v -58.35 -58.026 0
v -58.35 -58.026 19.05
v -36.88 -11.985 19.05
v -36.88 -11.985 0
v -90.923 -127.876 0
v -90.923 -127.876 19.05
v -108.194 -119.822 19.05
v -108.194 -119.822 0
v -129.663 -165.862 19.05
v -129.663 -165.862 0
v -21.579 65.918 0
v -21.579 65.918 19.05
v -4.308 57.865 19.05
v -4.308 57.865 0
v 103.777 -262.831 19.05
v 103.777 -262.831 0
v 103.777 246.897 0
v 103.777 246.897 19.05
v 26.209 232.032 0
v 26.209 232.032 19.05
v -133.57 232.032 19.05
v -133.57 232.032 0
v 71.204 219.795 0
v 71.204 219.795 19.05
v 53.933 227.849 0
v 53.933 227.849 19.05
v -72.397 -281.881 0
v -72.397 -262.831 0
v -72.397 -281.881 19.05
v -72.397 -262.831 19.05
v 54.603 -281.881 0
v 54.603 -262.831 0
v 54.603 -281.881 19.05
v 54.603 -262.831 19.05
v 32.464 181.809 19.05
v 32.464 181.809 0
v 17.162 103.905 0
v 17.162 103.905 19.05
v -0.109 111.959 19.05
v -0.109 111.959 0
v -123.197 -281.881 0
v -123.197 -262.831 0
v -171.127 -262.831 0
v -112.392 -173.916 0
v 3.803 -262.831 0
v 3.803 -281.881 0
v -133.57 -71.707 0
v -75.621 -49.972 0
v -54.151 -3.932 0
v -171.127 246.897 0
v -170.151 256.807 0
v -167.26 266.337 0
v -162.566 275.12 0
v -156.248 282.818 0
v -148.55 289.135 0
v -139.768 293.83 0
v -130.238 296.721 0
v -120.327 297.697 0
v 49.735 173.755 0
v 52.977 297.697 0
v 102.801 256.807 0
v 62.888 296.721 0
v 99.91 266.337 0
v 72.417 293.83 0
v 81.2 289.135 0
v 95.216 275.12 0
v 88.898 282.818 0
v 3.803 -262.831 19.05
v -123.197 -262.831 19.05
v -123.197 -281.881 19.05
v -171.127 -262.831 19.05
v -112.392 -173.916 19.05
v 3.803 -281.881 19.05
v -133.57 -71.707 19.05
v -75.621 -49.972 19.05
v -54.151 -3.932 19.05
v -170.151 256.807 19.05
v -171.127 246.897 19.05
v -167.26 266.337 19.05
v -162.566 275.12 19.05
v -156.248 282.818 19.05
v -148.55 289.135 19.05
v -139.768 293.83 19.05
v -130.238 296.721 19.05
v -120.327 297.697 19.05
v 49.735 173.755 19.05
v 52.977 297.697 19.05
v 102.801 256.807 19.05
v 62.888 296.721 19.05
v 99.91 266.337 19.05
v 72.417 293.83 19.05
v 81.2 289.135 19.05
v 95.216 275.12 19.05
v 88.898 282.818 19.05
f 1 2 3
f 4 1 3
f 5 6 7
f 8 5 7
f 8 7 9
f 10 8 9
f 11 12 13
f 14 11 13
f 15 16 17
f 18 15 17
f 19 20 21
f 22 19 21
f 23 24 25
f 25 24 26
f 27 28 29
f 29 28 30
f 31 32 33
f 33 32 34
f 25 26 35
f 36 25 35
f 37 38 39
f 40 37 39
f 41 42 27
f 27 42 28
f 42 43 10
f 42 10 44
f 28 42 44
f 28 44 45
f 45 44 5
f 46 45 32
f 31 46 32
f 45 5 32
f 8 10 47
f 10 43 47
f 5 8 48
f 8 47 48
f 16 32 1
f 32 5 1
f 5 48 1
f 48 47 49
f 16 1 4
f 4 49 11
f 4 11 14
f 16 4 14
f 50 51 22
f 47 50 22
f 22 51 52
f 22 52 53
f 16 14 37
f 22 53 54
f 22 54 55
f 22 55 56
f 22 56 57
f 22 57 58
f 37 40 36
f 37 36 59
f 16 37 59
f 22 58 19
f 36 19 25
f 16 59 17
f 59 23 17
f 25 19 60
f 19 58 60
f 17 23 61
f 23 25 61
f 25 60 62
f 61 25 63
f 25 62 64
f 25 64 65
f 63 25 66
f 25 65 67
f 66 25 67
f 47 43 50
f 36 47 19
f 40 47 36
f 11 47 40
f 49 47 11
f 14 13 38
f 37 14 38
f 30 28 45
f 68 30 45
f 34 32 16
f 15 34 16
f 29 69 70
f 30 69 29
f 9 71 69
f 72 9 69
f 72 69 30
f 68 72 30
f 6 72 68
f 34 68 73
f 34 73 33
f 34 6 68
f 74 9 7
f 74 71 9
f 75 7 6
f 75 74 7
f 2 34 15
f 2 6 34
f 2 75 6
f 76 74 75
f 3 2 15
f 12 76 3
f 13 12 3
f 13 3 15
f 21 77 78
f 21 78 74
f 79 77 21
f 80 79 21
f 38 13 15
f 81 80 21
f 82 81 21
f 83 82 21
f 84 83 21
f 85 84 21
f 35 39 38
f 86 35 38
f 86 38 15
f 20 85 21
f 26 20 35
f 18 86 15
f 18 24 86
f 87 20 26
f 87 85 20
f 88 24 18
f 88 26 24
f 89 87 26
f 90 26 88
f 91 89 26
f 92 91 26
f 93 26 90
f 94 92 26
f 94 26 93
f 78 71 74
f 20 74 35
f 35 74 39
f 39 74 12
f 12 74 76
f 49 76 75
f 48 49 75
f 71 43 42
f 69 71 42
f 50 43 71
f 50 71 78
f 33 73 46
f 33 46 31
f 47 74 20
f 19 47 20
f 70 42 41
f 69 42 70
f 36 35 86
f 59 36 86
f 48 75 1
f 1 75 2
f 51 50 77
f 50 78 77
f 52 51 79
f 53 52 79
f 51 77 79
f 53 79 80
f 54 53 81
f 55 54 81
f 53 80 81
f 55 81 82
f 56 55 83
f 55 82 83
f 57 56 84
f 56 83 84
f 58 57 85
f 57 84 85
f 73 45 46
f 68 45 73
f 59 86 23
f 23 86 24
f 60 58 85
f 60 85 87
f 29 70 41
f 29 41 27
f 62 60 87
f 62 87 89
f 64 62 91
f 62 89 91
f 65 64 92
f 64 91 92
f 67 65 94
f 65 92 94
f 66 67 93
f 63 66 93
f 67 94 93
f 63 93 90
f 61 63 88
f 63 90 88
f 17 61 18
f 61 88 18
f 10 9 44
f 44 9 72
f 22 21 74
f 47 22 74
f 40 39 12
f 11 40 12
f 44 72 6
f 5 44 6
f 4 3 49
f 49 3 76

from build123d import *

# Parameters (mm, degrees)
F0_W     = 274.9042
F0_H     = 560.5272
F1_DEPTH = 19.05
F3_DEPTH = 25.4
F4_W     = 50.8
F4_H     = 19.05
F5_DEPTH = 19.05
F7_DEPTH = 19.05
F8_R     = 50.8


with BuildPart() as f1:
    # F0 (on Top) → F1 (new body)
    with BuildSketch(Plane.XY):
        with Locations((-33.675123, 17.433073)):
            Rectangle(F0_W, F0_H)
    extrude(amount=F1_DEPTH)

    # F2 (on face) → F3 (cut)
    with BuildSketch(Plane.XY.offset(19.05)):
        Polygon((49.734686, 173.754715), (71.204288, 219.794873), (53.93326, 227.848758), (32.463658, 181.808599), align=None)
        Polygon((-21.578634, 65.918441), (-4.307605, 57.864557), (17.161997, 103.904715), (-0.109031, 111.958599), align=None)
        Polygon((-75.620925, -49.971717), (-58.349897, -58.025601), (-36.880294, -11.985443), (-54.151322, -3.931559), align=None)
        Polygon((-129.663216, -165.861875), (-112.392188, -173.915759), (-90.922585, -127.875601), (-108.193613, -119.821717), align=None)
    extrude(amount=-F3_DEPTH, mode=Mode.SUBTRACT)

    # F4 (on face) → F5 (join)
    with BuildSketch(Plane.XZ.offset(262.830527)):
        with Locations((-97.797423, 9.525)):
            Rectangle(F4_W, F4_H)
        with Locations((29.202577, 9.525)):
            Rectangle(F4_W, F4_H)
    extrude(amount=F5_DEPTH)

    # F6 (on face) → F7 (cut)
    with BuildSketch(Plane.XY.offset(19.05)):
        Polygon((-133.570358, -71.706755), (26.208879, 232.032016), (-133.570358, 232.032016), align=None)
    extrude(amount=-F7_DEPTH, mode=Mode.SUBTRACT)

    # F8
    f8_edges = [f1.edges().sort_by_distance(p)[0] for p in [
        (-171.127223, 297.696673, 9.525),
        (103.776977, 297.696673, 9.525),
    ]]
    fillet(f8_edges, radius=F8_R)


solid = f1.part
